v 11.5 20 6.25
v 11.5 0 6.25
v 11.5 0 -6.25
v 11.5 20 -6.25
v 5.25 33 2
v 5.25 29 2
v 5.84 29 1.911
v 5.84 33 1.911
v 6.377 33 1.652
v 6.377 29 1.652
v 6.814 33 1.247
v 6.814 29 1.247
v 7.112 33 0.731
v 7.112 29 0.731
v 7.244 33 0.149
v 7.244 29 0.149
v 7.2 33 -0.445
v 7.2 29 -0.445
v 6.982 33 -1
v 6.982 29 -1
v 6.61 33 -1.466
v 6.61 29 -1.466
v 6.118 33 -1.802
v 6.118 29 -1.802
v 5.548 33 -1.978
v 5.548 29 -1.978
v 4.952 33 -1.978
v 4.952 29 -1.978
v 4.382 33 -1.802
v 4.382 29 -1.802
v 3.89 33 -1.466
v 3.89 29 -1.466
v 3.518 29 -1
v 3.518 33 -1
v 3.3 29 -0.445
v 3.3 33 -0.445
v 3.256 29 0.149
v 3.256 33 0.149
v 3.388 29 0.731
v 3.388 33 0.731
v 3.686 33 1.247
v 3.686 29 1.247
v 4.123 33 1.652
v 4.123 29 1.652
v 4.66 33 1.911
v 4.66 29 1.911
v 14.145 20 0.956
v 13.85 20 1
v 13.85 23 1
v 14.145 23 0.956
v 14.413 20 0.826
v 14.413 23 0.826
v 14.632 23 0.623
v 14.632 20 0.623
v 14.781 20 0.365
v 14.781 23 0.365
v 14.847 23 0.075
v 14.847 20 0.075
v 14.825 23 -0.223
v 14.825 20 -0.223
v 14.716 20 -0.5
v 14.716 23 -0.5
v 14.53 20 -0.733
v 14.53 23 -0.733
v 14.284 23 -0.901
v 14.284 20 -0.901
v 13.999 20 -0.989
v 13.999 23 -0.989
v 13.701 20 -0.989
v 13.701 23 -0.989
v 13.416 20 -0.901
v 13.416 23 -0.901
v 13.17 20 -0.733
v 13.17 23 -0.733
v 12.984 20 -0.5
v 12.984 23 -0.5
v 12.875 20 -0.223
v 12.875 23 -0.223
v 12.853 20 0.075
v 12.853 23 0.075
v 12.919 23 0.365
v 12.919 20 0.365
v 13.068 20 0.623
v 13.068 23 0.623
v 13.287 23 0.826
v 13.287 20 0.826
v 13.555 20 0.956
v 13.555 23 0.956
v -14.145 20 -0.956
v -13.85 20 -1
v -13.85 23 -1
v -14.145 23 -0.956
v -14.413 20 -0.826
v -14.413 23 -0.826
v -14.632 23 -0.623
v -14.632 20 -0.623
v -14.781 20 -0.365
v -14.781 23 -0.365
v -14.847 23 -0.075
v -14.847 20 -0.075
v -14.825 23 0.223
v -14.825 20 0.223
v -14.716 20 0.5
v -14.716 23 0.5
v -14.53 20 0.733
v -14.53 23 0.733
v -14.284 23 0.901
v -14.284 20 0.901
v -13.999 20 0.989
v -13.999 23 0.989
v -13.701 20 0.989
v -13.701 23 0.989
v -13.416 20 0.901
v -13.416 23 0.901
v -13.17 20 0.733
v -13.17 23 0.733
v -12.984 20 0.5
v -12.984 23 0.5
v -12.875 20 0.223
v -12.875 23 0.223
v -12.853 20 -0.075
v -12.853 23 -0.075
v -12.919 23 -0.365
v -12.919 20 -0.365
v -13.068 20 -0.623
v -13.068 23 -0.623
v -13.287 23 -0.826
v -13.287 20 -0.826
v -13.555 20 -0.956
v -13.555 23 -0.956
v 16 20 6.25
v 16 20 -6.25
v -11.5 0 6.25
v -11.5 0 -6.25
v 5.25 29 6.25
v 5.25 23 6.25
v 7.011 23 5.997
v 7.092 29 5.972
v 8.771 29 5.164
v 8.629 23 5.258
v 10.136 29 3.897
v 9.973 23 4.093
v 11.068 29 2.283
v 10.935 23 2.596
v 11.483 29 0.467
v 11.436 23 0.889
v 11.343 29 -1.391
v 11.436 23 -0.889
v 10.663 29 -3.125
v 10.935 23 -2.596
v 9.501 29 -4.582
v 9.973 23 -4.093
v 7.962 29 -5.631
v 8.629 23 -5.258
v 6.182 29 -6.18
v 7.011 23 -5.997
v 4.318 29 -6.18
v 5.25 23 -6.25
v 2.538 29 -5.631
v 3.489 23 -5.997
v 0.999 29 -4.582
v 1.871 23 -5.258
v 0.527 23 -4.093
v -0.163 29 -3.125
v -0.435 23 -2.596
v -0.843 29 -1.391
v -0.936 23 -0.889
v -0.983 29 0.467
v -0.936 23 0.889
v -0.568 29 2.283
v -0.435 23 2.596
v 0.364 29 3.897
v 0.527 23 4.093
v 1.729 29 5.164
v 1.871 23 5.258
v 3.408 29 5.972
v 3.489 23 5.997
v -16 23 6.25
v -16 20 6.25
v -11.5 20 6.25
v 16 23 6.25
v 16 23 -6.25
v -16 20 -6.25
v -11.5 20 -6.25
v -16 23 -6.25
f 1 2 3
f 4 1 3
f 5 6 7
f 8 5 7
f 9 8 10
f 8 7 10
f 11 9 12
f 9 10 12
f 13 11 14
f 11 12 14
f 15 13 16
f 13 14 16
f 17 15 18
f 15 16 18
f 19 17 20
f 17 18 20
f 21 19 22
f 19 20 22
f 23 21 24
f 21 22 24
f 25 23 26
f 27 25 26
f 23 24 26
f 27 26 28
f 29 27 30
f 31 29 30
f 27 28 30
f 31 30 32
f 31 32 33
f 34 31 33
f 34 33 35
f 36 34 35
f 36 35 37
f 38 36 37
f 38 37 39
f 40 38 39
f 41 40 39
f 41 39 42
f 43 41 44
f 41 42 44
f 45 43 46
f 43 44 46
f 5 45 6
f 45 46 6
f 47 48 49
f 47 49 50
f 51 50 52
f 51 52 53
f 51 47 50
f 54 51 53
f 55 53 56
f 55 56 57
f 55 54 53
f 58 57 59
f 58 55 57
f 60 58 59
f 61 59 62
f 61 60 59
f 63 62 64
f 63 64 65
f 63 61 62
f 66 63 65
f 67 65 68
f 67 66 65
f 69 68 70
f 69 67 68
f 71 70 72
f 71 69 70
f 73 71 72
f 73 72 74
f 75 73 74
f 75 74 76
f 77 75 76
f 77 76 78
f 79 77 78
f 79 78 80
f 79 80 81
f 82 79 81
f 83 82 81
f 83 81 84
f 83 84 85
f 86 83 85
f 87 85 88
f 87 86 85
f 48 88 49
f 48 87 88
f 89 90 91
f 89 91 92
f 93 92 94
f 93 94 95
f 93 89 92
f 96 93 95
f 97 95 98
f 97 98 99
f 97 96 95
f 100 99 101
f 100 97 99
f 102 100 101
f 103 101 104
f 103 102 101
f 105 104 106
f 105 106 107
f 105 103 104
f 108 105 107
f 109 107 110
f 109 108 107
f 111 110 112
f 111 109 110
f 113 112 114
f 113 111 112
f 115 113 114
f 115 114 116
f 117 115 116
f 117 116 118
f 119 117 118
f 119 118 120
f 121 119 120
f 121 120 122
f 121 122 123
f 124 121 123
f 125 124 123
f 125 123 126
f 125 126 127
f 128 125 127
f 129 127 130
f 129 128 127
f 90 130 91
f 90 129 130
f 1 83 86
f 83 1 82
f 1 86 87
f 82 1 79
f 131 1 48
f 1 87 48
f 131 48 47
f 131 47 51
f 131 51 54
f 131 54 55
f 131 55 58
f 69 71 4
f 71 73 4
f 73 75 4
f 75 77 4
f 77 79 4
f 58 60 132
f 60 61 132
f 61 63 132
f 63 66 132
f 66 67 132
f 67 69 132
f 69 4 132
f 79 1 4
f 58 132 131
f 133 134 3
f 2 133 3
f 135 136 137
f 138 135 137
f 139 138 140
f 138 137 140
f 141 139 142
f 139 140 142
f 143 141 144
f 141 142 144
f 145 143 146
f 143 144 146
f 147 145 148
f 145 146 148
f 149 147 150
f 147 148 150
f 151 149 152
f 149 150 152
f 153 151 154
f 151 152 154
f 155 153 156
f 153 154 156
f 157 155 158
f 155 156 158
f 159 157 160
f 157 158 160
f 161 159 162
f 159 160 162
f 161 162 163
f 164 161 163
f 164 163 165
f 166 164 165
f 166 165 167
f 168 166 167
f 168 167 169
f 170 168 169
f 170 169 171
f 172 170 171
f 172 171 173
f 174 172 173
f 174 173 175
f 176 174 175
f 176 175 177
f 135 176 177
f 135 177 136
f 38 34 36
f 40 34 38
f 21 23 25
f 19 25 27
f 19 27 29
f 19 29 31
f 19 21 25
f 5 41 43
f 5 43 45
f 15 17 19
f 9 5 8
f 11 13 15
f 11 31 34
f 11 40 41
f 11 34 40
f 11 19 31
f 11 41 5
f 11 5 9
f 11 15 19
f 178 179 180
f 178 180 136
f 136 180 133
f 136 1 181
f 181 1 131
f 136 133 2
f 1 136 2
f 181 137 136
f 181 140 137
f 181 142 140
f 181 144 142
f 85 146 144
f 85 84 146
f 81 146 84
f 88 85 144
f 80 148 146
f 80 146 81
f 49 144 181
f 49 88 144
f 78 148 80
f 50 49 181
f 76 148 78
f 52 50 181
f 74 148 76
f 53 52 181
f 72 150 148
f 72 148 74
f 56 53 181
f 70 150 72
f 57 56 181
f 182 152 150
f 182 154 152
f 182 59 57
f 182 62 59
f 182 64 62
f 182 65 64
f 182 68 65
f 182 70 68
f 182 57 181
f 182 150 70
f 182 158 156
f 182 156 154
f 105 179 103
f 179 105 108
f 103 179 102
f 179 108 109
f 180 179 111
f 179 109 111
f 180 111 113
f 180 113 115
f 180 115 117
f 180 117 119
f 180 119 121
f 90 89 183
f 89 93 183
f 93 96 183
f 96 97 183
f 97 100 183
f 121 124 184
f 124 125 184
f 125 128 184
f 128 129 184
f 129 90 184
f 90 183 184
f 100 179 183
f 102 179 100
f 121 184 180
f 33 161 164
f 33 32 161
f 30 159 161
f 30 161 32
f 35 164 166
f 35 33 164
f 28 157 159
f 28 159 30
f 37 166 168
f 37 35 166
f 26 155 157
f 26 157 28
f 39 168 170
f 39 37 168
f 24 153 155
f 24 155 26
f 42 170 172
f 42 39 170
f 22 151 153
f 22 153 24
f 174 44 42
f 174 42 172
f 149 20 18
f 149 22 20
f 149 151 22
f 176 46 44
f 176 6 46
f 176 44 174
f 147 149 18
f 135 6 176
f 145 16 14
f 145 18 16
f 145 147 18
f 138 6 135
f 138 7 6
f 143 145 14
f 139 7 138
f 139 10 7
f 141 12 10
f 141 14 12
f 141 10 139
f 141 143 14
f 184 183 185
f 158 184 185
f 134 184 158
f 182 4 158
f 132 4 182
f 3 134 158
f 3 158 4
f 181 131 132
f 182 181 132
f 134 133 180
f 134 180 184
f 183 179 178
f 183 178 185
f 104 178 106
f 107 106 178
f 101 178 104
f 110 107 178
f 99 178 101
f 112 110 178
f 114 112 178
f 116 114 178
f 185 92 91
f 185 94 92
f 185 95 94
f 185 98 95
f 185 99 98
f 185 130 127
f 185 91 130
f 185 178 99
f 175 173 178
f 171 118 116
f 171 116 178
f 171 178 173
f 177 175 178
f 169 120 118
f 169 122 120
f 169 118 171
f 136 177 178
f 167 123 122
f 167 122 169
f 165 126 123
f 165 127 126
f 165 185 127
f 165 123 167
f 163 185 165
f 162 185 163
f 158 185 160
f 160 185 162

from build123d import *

# Parameters (mm, degrees)
SKETCH_1_W      = 23
SKETCH_1_H      = 12.5
EXTRUDE_1_DEPTH = 20
SKETCH_2_W      = 32
SKETCH_2_H      = 12.5
SKETCH_2_R      = 1
EXTRUDE_2_DEPTH = 3
SKETCH_4_R      = 6.25
EXTRUDE_3_DEPTH = 6
SKETCH_5_R      = 2
EXTRUDE_4_DEPTH = 4


with BuildPart() as part:
    # 草图1 → 凸台-拉伸1 (new body)
    with BuildSketch(Plane(origin=(0, 0, 0), x_dir=(1, 0, 0), z_dir=(0, 1, 0))):
        Rectangle(SKETCH_1_W, SKETCH_1_H)
    extrude(amount=EXTRUDE_1_DEPTH)

    # 草图2 → 凸台-拉伸2 (add)
    with BuildSketch(Plane(origin=(0, 20, 0), x_dir=(1, 0, 0), z_dir=(0, 1, 0))):
        Rectangle(SKETCH_2_W, SKETCH_2_H)
        with Locations(Location((13.85, 0, 0), (0, 0, 270))):
            Circle(SKETCH_2_R, mode=Mode.SUBTRACT)
        with Locations(Location((-13.85, 0, 0), (0, 0, 90))):
            Circle(SKETCH_2_R, mode=Mode.SUBTRACT)
    extrude(amount=EXTRUDE_2_DEPTH)

    # 草图4 → 凸台-拉伸3 (add)
    with BuildSketch(Plane(origin=(0, 23, 0), x_dir=(1, 0, 0), z_dir=(0, 1, 0))):
        with Locations(Location((5.25, 0, 0), (0, 0, 270))):
            Circle(SKETCH_4_R)
    extrude(amount=EXTRUDE_3_DEPTH)

    # 草图5 → 凸台-拉伸4 (add)
    with BuildSketch(Plane(origin=(0, 29, 0), x_dir=(1, 0, 0), z_dir=(0, 1, 0))):
        with Locations(Location((5.25, 0, 0), (0, 0, 270))):
            Circle(SKETCH_5_R)
    extrude(amount=EXTRUDE_4_DEPTH)


solid = part.part
